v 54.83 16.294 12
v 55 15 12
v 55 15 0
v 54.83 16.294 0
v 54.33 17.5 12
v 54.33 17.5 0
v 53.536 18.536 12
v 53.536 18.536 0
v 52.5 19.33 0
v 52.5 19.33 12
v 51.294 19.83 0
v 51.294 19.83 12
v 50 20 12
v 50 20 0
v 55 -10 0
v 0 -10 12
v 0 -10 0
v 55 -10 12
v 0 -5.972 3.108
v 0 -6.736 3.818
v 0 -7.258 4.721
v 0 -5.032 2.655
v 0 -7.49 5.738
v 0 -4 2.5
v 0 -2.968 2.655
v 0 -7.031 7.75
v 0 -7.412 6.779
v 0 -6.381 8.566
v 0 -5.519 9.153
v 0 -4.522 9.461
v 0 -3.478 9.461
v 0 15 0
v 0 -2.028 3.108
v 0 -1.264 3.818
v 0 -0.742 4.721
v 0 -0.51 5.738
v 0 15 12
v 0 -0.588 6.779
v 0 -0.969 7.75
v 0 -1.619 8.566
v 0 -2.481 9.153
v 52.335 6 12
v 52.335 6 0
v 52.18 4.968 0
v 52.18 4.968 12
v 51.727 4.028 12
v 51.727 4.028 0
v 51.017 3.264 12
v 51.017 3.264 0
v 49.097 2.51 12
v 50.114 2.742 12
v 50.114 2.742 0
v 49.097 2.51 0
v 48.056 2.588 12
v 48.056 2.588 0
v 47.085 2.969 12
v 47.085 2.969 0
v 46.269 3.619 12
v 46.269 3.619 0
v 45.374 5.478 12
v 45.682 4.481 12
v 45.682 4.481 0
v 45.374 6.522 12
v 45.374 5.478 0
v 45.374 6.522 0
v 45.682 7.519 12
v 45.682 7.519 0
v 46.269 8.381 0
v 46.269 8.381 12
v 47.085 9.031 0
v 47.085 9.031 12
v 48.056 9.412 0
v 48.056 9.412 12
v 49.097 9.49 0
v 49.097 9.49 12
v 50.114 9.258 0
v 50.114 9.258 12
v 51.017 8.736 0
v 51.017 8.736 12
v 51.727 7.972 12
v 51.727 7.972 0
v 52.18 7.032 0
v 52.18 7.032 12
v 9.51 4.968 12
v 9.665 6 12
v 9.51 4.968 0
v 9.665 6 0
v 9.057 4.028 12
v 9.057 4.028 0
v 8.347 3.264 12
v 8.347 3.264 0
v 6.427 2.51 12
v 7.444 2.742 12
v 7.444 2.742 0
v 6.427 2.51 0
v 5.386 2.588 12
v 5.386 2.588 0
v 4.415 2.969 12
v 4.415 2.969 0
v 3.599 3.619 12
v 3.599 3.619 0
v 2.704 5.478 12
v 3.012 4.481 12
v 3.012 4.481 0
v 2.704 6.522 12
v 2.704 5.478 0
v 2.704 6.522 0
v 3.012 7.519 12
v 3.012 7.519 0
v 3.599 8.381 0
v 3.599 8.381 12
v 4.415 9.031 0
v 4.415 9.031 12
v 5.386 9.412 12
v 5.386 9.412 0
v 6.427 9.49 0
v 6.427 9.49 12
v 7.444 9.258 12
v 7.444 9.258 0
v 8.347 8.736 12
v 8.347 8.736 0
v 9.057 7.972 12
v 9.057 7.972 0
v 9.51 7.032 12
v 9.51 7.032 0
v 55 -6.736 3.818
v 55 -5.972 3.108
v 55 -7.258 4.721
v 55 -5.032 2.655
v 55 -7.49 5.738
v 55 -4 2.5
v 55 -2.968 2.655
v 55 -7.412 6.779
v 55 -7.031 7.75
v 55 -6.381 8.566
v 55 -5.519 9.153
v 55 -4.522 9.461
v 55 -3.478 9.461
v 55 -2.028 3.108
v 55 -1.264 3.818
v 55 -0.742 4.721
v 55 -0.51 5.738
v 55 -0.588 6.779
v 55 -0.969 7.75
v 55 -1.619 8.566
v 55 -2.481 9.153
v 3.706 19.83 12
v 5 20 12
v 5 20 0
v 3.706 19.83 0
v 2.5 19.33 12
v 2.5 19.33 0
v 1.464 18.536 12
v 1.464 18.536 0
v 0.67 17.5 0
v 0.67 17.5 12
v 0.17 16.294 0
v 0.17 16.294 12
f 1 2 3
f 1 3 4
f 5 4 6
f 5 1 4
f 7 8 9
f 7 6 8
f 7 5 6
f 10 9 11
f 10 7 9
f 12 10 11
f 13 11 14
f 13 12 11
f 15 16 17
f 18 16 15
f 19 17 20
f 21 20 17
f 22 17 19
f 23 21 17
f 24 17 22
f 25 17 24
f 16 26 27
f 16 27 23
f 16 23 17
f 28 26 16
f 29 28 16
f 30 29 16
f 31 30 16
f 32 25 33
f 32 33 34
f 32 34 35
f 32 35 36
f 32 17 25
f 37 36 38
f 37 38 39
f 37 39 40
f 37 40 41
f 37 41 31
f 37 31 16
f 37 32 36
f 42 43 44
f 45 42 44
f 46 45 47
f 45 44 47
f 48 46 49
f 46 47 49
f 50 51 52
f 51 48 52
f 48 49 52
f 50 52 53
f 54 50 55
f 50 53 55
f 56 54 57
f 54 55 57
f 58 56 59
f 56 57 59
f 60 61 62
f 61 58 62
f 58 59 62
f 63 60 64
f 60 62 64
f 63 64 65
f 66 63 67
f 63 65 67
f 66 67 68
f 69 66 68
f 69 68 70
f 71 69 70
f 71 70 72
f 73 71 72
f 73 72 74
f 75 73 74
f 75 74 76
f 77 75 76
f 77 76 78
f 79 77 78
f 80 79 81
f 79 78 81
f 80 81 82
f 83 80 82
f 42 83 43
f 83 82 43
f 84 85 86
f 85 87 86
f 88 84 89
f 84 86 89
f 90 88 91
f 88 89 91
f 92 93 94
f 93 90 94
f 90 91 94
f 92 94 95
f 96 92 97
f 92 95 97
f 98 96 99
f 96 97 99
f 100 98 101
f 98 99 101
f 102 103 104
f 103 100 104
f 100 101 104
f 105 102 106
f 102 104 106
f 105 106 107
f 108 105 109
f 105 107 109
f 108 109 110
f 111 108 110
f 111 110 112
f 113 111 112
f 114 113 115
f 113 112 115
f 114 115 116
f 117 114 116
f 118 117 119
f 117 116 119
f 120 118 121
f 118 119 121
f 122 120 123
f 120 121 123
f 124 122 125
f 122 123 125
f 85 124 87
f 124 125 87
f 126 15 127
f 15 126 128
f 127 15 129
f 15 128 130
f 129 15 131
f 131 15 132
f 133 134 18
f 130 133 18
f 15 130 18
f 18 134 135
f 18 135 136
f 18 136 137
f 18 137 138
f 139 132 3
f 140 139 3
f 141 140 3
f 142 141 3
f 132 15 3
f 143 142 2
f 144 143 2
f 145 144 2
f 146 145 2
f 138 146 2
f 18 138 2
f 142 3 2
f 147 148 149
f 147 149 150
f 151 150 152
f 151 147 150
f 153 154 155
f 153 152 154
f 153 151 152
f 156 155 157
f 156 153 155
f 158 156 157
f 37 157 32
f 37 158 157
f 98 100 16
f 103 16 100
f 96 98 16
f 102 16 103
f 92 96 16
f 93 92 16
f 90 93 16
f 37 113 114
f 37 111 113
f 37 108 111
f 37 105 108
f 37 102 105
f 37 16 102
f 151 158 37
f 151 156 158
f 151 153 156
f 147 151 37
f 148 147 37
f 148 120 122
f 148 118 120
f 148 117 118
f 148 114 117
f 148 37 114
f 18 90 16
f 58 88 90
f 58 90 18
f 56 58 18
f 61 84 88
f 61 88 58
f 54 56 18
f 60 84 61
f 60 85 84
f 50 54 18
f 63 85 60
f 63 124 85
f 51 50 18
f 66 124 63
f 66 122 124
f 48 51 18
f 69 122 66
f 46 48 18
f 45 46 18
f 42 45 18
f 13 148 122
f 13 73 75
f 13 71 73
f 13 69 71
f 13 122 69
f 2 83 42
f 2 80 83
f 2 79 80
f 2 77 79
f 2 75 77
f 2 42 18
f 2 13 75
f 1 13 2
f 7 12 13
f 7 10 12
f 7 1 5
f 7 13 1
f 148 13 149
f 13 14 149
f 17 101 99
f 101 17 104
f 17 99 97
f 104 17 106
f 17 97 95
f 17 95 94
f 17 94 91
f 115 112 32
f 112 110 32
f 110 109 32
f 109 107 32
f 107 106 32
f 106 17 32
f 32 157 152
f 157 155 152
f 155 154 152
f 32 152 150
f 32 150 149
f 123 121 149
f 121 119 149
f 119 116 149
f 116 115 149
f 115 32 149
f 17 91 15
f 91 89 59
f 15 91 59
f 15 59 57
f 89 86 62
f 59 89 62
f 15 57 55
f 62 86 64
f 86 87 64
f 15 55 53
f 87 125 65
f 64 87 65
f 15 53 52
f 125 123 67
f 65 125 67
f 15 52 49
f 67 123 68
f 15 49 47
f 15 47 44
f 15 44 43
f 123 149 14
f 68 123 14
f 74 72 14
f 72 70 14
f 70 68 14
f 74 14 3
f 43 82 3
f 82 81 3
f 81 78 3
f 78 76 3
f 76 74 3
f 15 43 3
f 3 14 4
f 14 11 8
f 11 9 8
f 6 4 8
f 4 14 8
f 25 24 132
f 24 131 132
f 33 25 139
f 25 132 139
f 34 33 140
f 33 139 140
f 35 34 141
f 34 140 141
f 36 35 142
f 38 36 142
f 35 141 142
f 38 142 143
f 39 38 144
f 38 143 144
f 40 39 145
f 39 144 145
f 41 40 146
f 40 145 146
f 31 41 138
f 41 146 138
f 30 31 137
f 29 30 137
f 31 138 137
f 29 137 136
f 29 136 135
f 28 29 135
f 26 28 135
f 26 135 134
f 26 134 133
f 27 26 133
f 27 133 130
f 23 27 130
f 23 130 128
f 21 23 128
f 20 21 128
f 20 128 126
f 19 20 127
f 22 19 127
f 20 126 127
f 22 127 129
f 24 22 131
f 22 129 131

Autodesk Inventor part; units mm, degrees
ref_plane "YZ Plane" through (0, 0, 0) normal (1, 0, 0) x (0, 1, 0)
ref_plane "XZ Plane" through (0, 0, 0) normal (0, 1, 0) x (-1, 0, 0)
ref_plane "XY Plane" through (0, 0, 0) normal (0, 0, 1) x (1, 0, 0)
sketch "Boceto1" plane through (0, 0, 0) normal (0, 0, 1) x (1, 0, 0)
  line L0 (0, 0) -> (55, 0)
  line L1 (55, 0) -> (55, 20)
  line L2 (55, 20) -> (0, 20)
  line L3 (0, 20) -> (0, 0)
  circle A0 centre (6.165, 6) radius 3.5
  line L4 (27.5, 20) -> (27.5, 0)
  circle A1 centre (48.835, 6) radius 3.5
  dimension "d0" = 7
  dimension "d1" = 55
  dimension "d3" = 20
  dimension "d23" = 42.67
  dimension "d31" = 6
extrude "Extrusión1" add sketch "Boceto1" along normal blind 12
fillet "Empalme1" radius 5 2 edges at (55, 20, 6) (0, 20, 6)
sketch "Boceto7" plane through (0, 0, 0) normal (0, -1, 0) x (1, 0, 0)
  line L0 (0, 0) -> (0, 12) projected
  line L1 (0, 12) -> (55, 12) projected
  line L2 (0, 0) -> (55, 0)
  line L3 (55, 0) -> (55, 12)
  line L4 (55, 12) -> (0, 12)
  line L5 (0, 12) -> (0, 0)
extrude "Extrusión5" add sketch "Boceto7" along normal blind 10
sketch "Boceto8" plane through (55, 15, 12) normal (1, 0, 0) x (0, 0, -1)
  circle A0 centre (6, -19) radius 3.5
  line L0 (12, -25) -> (0, -25) projected
  line L1 (12, 0) -> (12, -25) projected
  point P0 (6, -25)
  dimension "d26" = 7
  dimension "d27" = 6
extrude "Extrusión6" cut sketch "Boceto8" against normal blind 55
properties part number "SoporteDerecha"
